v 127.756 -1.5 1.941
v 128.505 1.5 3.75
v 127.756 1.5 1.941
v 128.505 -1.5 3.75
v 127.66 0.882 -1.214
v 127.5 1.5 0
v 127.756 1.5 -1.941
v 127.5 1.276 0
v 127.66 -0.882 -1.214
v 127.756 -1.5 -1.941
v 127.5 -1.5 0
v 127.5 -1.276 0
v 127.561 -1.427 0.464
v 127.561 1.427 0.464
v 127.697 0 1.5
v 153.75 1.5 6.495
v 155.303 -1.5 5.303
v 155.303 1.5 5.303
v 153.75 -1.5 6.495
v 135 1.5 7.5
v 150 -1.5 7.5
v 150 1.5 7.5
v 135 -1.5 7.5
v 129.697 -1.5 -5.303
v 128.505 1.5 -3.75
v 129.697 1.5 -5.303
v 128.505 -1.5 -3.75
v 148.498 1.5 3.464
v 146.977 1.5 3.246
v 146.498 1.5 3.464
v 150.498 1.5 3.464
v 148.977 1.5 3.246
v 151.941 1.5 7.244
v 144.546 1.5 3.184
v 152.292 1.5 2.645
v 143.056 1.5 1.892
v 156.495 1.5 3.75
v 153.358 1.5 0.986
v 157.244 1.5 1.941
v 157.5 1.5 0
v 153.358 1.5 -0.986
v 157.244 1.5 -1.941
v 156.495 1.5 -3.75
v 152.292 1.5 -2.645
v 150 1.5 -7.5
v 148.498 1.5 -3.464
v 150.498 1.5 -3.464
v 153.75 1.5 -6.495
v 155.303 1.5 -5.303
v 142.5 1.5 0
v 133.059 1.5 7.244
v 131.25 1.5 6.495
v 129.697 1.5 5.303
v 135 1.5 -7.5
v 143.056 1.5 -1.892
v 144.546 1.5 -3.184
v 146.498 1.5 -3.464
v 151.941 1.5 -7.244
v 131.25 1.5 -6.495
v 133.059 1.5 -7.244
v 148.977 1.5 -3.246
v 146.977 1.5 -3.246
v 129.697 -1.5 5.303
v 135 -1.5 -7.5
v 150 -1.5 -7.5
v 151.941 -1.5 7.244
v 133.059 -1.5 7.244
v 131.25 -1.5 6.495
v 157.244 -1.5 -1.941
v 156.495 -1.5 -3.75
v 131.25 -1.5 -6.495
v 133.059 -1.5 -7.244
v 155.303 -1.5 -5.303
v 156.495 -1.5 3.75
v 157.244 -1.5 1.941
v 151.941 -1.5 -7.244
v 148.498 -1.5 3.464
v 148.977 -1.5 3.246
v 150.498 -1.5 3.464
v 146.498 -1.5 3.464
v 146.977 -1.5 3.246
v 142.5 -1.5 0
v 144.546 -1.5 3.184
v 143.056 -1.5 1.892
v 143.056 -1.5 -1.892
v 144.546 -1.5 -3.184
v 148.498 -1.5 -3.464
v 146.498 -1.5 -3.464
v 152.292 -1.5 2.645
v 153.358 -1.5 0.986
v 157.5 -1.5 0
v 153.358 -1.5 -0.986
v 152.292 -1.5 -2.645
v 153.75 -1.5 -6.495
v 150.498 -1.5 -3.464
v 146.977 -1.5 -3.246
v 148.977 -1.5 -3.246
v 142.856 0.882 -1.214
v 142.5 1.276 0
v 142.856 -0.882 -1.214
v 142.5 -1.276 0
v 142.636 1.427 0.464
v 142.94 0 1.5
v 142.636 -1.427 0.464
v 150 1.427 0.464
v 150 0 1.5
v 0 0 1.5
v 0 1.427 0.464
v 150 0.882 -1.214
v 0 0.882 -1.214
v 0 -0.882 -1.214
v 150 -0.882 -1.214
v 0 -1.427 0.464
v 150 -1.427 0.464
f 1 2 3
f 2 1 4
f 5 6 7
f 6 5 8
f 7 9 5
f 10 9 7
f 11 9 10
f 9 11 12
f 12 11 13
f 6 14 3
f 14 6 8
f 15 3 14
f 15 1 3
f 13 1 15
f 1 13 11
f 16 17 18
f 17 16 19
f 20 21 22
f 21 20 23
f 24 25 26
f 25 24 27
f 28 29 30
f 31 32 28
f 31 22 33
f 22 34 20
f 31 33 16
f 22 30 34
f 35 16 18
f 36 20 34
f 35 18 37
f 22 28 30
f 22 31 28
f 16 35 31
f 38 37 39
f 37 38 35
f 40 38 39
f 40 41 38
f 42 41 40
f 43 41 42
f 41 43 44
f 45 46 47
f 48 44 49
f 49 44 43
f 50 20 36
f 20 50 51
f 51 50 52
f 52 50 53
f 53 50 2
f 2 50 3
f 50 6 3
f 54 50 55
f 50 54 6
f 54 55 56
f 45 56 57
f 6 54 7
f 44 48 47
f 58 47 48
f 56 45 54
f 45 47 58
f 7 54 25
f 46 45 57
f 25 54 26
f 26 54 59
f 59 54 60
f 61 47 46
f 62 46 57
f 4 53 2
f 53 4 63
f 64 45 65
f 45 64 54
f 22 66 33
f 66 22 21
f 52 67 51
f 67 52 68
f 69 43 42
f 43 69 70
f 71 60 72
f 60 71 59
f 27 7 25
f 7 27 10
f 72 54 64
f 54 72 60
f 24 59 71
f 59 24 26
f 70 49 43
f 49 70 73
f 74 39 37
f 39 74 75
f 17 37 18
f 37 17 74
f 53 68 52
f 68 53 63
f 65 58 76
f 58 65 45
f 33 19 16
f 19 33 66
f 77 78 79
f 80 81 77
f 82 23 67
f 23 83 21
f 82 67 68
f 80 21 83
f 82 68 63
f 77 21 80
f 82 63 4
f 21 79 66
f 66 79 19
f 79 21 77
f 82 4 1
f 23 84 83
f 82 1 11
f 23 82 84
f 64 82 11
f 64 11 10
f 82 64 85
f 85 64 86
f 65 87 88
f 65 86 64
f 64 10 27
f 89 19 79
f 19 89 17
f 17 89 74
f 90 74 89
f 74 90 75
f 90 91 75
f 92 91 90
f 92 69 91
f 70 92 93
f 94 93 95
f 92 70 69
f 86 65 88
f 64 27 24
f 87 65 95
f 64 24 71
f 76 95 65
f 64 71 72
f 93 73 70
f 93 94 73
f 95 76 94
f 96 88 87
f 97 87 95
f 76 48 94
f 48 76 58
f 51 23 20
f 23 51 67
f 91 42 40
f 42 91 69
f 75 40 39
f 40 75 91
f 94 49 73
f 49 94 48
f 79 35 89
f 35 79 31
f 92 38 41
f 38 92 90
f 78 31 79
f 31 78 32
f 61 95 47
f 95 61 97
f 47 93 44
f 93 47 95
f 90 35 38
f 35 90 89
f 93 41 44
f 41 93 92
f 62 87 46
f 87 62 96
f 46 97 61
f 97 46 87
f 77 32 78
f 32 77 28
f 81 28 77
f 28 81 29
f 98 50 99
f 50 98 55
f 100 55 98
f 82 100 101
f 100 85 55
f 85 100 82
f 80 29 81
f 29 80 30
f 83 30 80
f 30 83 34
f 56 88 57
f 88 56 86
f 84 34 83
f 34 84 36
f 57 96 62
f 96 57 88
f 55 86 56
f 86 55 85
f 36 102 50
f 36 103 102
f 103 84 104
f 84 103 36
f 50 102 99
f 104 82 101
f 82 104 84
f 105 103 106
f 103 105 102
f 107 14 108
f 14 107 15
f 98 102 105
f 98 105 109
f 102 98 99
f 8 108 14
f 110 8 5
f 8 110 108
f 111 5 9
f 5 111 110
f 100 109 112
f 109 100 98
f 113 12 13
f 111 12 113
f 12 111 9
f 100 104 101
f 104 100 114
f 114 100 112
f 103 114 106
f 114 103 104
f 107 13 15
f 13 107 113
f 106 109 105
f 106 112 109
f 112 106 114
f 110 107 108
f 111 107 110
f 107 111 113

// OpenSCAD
Vanta(150);


//vantaLen = 150;
vantaDia = 3;

module Vanta(vantaLen) {

    rotate([0, 180, 0])
    translate([-vantaLen, 0, 0])
    {


      difference() {
  
        hull(){
          translate([0,vantaDia/2,0])
          rotate([90, 0, 0])
          cylinder(h=vantaDia, r=7.5);
      
          translate([15,vantaDia/2,0])
          rotate([90, 0, 0])
          cylinder(h=vantaDia, r=7.5);
        }
  
        translate([0,vantaDia/2+1,0])
        rotate([90, 0, 0])
        cylinder(h=vantaDia+2, r=3.5);
        
        translate([2,vantaDia/2+1,0])
        rotate([90, 0, 0])
        cylinder(h=vantaDia+2, r=3.5);
        
        translate([4,vantaDia/2+1,0])
        rotate([90, 0, 0])
        cylinder(h=vantaDia+2, r=3.5);
      }
  
  
      rotate([0, 90, 0])
      cylinder(h=vantaLen, r=vantaDia/2);


    }
}
